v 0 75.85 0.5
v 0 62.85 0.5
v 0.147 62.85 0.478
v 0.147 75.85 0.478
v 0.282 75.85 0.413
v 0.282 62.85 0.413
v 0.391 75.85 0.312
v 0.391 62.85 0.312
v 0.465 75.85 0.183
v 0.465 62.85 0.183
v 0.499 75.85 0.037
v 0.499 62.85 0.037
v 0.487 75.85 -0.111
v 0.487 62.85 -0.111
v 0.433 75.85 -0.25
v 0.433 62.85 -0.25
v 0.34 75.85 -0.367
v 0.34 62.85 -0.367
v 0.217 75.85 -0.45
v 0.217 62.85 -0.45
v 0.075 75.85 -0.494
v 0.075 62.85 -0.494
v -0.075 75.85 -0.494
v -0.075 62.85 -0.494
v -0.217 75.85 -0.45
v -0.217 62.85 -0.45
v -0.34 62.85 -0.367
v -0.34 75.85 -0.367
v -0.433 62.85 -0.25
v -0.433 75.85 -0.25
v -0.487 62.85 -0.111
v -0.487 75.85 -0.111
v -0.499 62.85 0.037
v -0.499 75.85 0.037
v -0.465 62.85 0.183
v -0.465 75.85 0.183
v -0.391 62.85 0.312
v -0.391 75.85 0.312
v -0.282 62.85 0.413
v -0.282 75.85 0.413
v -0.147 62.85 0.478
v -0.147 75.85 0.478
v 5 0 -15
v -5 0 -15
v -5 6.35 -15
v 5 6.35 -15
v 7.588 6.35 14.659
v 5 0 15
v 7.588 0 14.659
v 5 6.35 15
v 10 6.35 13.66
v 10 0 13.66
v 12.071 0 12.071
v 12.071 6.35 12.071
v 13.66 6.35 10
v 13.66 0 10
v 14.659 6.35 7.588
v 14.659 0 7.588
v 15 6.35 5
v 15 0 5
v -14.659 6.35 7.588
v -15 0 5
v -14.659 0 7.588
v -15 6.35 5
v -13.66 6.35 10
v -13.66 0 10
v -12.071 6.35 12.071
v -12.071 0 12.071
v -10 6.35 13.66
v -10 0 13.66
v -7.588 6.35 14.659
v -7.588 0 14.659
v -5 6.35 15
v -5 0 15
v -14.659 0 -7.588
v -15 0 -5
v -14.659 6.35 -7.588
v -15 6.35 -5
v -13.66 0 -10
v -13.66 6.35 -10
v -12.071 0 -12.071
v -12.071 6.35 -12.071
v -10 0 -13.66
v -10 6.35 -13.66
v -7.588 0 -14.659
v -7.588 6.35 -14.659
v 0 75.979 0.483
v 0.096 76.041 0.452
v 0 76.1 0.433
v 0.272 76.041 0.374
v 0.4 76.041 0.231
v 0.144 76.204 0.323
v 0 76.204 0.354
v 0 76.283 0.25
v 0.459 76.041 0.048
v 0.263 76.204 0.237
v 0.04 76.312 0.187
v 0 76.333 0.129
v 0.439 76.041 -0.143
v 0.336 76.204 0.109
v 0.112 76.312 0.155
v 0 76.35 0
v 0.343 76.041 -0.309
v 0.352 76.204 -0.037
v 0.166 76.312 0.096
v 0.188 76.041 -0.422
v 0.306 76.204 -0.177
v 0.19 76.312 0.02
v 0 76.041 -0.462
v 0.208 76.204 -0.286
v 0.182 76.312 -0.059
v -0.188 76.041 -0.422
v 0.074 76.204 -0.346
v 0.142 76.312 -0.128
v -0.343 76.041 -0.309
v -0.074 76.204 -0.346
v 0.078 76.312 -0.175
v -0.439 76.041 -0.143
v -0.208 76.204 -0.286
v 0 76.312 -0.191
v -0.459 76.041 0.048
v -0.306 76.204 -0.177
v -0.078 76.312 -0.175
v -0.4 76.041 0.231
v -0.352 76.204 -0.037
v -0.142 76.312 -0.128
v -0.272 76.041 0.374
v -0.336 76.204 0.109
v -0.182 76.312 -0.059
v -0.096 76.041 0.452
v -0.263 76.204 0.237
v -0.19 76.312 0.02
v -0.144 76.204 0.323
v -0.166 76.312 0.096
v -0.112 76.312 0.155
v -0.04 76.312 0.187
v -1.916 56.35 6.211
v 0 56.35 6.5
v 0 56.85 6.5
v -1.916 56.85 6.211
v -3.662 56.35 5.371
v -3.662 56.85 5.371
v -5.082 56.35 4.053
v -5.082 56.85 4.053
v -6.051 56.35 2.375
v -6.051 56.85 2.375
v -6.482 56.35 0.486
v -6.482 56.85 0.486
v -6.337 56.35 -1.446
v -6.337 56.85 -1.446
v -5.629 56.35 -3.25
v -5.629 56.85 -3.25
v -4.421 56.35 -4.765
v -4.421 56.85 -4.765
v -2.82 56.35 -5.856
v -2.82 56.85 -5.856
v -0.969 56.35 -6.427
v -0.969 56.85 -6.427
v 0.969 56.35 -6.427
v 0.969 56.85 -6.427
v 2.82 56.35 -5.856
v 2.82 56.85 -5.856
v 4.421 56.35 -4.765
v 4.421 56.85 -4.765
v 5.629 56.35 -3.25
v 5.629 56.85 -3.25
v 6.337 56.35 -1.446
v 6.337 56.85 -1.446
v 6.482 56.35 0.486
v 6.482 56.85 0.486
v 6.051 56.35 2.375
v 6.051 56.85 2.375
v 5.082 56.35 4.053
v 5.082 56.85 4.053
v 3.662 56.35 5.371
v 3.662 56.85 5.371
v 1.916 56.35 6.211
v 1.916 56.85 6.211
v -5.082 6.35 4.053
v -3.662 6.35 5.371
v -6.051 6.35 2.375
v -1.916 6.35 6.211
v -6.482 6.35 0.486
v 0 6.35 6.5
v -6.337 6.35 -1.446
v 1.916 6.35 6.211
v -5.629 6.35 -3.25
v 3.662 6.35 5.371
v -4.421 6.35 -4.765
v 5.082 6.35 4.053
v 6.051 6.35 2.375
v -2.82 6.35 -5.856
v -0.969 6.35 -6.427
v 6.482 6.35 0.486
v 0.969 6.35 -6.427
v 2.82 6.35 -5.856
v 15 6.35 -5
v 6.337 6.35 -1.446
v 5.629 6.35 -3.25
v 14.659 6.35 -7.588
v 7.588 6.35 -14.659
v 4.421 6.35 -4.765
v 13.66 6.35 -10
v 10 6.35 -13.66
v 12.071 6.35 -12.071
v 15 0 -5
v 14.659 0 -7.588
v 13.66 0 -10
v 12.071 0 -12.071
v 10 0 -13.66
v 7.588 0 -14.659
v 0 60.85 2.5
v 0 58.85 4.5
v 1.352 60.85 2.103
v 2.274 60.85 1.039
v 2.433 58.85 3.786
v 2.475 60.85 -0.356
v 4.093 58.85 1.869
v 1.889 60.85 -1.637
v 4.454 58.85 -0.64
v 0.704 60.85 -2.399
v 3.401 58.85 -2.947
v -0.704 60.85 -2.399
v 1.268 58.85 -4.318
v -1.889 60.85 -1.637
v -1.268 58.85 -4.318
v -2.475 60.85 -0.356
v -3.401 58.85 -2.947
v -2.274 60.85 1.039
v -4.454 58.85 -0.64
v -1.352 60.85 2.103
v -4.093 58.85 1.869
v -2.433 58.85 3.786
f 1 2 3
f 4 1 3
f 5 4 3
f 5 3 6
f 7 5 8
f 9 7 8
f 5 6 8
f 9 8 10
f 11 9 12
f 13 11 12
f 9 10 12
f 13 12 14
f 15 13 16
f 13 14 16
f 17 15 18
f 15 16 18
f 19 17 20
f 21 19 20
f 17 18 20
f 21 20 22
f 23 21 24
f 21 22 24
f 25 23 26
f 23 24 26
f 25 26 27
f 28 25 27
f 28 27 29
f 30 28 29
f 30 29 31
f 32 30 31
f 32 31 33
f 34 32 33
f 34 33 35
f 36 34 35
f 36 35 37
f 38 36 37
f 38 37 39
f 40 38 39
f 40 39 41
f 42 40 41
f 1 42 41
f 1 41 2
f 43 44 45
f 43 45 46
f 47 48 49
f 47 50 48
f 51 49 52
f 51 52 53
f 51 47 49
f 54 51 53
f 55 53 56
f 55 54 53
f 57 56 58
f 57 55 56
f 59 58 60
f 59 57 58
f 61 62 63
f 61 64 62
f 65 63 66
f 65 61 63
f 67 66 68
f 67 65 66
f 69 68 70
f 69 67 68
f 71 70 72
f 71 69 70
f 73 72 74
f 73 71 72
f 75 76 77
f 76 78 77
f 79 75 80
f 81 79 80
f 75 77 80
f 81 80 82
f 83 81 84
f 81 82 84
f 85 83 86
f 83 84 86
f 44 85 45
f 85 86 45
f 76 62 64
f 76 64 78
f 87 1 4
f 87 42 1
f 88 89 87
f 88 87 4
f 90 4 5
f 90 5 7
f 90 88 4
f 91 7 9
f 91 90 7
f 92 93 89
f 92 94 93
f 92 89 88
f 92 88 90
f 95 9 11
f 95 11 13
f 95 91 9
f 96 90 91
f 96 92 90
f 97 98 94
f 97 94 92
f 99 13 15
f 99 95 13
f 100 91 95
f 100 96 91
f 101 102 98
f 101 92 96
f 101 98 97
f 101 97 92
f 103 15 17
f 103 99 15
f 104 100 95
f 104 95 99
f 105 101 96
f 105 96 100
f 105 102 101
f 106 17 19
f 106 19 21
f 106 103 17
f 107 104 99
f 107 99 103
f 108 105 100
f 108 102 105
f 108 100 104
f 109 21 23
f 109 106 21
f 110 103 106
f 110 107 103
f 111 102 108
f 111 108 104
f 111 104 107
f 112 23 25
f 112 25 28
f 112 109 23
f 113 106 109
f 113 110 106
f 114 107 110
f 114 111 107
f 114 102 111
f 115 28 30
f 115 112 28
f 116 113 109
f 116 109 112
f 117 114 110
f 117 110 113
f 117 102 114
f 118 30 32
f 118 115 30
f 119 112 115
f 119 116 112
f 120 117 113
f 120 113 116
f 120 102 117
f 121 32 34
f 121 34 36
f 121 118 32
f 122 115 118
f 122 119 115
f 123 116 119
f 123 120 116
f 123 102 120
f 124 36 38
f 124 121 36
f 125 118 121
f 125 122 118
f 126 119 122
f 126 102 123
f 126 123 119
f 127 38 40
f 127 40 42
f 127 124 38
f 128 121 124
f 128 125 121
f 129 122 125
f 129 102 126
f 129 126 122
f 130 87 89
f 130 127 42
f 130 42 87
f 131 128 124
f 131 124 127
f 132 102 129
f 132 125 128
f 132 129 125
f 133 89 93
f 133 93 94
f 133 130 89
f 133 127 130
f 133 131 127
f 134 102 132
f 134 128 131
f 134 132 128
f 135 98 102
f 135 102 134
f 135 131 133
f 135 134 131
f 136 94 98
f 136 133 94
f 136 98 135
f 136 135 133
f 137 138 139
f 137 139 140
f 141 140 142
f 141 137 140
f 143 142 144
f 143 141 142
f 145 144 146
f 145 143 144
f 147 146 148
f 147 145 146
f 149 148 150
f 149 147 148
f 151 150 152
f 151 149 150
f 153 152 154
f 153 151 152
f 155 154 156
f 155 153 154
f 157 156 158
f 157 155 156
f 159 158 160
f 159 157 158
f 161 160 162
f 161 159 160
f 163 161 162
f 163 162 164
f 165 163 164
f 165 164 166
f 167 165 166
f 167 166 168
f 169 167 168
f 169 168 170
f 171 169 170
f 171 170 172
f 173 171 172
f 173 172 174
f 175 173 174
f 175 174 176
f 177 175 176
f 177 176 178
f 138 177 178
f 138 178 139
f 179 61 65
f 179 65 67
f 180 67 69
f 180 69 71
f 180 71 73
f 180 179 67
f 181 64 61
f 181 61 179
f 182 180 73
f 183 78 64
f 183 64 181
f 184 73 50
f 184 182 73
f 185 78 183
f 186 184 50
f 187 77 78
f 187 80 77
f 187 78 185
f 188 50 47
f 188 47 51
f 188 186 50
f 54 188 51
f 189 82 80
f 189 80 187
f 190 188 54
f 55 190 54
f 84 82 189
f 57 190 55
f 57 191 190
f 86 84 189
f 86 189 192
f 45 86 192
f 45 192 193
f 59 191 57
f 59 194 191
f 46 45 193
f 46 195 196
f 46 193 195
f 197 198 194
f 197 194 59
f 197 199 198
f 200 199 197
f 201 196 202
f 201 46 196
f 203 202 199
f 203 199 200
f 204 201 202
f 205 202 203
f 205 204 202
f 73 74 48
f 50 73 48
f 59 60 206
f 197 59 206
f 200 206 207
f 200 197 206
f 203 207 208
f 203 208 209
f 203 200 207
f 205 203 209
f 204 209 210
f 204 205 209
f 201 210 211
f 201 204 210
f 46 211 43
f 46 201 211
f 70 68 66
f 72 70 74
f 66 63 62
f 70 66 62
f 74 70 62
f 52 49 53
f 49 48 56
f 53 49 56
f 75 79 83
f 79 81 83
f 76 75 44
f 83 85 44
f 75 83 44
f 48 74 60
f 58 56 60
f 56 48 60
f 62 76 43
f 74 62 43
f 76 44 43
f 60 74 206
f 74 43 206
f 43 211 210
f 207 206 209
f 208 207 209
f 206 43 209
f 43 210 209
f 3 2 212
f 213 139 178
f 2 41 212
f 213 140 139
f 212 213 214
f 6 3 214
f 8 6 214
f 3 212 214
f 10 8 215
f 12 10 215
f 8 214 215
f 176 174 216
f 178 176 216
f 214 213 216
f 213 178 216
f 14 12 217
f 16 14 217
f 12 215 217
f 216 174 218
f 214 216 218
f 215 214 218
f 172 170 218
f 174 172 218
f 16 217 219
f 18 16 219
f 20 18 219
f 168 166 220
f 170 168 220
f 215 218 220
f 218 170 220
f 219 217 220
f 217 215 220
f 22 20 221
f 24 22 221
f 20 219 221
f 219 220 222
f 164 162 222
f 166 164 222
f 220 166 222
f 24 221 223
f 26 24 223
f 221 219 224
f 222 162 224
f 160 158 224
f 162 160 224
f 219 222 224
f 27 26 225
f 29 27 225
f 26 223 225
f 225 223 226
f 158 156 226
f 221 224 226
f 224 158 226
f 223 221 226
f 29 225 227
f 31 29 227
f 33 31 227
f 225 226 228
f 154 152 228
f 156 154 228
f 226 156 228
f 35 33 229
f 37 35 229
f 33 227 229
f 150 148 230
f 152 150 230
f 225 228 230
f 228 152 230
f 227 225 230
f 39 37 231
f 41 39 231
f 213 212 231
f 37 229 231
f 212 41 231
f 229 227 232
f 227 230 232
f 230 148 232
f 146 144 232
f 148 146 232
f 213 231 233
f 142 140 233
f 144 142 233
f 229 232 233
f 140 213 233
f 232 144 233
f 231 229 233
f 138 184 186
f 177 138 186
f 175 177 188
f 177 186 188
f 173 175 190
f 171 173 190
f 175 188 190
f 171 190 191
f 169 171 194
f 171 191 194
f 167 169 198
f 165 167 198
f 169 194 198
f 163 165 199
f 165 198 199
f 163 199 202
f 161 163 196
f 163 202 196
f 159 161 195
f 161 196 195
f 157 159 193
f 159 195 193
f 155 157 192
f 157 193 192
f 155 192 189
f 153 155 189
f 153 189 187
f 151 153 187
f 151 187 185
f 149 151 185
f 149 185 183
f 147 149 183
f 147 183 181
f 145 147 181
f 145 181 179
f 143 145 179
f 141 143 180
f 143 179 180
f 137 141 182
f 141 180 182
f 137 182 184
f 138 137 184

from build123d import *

# Parameters (mm, degrees)
SKETCH2_W           = 30
SKETCH2_H           = 30
BOSS_EXTRUDE1_DEPTH = 6.35
FILLET1_R           = 10
SKETCH3_R           = 6.5
BOSS_EXTRUDE2_DEPTH = 50
SKETCH4_R           = 0.5
BOSS_EXTRUDE3_DEPTH = 20
FILLET2_R           = 0.5
CHAMFER1_SIZE       = 6.5


with BuildPart() as part:
    # Sketch2 → Boss-Extrude1 (new body)
    with BuildSketch(Plane(origin=(0, 0, 0), x_dir=(1, 0, 0), z_dir=(0, 1, 0))):
        Rectangle(SKETCH2_W, SKETCH2_H)
    extrude(amount=BOSS_EXTRUDE1_DEPTH)

    # Fillet1
    fillet1_edges = [part.edges().sort_by_distance(p)[0] for p in [
        (-15, 3.175, 15),
        (-15, 3.175, -15),
        (15, 3.175, -15),
        (15, 3.175, 15),
    ]]
    fillet(fillet1_edges, radius=FILLET1_R)

    # Sketch3 → Boss-Extrude2 (add)
    with BuildSketch(Plane(origin=(0, 6.35, 0), x_dir=(1, 0, 0), z_dir=(0, 1, 0))):
        with Locations(Location((0, 0, 0), (0, 0, 270))):
            Circle(SKETCH3_R)
    extrude(amount=BOSS_EXTRUDE2_DEPTH)

    # Sketch4 → Boss-Extrude3 (add)
    with BuildSketch(Plane(origin=(0, 56.35, 0), x_dir=(1, 0, 0), z_dir=(0, 1, 0))):
        with Locations(Location((0, 0, 0), (0, 0, 270))):
            Circle(SKETCH4_R)
    extrude(amount=BOSS_EXTRUDE3_DEPTH)

    # Fillet2
    fillet2_edges = [part.edges().sort_by_distance(p)[0] for p in [
        (0, 76.35, -0.5),
    ]]
    fillet(fillet2_edges, radius=FILLET2_R)

    # Chamfer1
    # the kernel refuses this chamfer: 6.5 mm, written as the material it adds along each edge
    with BuildSketch(Plane(origin=(0, 56.35, 0), x_dir=(0, 0, 1), z_dir=(-1, 0, 0))) as chamfer1_piece_1_section:
        Polygon((0.5, CHAMFER1_SIZE), (0.5 + CHAMFER1_SIZE, 0), (0.5, 0), align=None)
    chamfer1_piece_1 = revolve(axis=Axis((0, 56.35, 0), (0, 1, 0)), mode=Mode.PRIVATE)
    chamfer1_piece_1 = chamfer1_piece_1 & Plane(origin=(0, 59.89101351, 0), x_dir=(0, 0, 1), z_dir=(0, -1, 0)) * Cylinder(6.5, 28, mode=Mode.PRIVATE)
    add(chamfer1_piece_1)


solid = part.part
